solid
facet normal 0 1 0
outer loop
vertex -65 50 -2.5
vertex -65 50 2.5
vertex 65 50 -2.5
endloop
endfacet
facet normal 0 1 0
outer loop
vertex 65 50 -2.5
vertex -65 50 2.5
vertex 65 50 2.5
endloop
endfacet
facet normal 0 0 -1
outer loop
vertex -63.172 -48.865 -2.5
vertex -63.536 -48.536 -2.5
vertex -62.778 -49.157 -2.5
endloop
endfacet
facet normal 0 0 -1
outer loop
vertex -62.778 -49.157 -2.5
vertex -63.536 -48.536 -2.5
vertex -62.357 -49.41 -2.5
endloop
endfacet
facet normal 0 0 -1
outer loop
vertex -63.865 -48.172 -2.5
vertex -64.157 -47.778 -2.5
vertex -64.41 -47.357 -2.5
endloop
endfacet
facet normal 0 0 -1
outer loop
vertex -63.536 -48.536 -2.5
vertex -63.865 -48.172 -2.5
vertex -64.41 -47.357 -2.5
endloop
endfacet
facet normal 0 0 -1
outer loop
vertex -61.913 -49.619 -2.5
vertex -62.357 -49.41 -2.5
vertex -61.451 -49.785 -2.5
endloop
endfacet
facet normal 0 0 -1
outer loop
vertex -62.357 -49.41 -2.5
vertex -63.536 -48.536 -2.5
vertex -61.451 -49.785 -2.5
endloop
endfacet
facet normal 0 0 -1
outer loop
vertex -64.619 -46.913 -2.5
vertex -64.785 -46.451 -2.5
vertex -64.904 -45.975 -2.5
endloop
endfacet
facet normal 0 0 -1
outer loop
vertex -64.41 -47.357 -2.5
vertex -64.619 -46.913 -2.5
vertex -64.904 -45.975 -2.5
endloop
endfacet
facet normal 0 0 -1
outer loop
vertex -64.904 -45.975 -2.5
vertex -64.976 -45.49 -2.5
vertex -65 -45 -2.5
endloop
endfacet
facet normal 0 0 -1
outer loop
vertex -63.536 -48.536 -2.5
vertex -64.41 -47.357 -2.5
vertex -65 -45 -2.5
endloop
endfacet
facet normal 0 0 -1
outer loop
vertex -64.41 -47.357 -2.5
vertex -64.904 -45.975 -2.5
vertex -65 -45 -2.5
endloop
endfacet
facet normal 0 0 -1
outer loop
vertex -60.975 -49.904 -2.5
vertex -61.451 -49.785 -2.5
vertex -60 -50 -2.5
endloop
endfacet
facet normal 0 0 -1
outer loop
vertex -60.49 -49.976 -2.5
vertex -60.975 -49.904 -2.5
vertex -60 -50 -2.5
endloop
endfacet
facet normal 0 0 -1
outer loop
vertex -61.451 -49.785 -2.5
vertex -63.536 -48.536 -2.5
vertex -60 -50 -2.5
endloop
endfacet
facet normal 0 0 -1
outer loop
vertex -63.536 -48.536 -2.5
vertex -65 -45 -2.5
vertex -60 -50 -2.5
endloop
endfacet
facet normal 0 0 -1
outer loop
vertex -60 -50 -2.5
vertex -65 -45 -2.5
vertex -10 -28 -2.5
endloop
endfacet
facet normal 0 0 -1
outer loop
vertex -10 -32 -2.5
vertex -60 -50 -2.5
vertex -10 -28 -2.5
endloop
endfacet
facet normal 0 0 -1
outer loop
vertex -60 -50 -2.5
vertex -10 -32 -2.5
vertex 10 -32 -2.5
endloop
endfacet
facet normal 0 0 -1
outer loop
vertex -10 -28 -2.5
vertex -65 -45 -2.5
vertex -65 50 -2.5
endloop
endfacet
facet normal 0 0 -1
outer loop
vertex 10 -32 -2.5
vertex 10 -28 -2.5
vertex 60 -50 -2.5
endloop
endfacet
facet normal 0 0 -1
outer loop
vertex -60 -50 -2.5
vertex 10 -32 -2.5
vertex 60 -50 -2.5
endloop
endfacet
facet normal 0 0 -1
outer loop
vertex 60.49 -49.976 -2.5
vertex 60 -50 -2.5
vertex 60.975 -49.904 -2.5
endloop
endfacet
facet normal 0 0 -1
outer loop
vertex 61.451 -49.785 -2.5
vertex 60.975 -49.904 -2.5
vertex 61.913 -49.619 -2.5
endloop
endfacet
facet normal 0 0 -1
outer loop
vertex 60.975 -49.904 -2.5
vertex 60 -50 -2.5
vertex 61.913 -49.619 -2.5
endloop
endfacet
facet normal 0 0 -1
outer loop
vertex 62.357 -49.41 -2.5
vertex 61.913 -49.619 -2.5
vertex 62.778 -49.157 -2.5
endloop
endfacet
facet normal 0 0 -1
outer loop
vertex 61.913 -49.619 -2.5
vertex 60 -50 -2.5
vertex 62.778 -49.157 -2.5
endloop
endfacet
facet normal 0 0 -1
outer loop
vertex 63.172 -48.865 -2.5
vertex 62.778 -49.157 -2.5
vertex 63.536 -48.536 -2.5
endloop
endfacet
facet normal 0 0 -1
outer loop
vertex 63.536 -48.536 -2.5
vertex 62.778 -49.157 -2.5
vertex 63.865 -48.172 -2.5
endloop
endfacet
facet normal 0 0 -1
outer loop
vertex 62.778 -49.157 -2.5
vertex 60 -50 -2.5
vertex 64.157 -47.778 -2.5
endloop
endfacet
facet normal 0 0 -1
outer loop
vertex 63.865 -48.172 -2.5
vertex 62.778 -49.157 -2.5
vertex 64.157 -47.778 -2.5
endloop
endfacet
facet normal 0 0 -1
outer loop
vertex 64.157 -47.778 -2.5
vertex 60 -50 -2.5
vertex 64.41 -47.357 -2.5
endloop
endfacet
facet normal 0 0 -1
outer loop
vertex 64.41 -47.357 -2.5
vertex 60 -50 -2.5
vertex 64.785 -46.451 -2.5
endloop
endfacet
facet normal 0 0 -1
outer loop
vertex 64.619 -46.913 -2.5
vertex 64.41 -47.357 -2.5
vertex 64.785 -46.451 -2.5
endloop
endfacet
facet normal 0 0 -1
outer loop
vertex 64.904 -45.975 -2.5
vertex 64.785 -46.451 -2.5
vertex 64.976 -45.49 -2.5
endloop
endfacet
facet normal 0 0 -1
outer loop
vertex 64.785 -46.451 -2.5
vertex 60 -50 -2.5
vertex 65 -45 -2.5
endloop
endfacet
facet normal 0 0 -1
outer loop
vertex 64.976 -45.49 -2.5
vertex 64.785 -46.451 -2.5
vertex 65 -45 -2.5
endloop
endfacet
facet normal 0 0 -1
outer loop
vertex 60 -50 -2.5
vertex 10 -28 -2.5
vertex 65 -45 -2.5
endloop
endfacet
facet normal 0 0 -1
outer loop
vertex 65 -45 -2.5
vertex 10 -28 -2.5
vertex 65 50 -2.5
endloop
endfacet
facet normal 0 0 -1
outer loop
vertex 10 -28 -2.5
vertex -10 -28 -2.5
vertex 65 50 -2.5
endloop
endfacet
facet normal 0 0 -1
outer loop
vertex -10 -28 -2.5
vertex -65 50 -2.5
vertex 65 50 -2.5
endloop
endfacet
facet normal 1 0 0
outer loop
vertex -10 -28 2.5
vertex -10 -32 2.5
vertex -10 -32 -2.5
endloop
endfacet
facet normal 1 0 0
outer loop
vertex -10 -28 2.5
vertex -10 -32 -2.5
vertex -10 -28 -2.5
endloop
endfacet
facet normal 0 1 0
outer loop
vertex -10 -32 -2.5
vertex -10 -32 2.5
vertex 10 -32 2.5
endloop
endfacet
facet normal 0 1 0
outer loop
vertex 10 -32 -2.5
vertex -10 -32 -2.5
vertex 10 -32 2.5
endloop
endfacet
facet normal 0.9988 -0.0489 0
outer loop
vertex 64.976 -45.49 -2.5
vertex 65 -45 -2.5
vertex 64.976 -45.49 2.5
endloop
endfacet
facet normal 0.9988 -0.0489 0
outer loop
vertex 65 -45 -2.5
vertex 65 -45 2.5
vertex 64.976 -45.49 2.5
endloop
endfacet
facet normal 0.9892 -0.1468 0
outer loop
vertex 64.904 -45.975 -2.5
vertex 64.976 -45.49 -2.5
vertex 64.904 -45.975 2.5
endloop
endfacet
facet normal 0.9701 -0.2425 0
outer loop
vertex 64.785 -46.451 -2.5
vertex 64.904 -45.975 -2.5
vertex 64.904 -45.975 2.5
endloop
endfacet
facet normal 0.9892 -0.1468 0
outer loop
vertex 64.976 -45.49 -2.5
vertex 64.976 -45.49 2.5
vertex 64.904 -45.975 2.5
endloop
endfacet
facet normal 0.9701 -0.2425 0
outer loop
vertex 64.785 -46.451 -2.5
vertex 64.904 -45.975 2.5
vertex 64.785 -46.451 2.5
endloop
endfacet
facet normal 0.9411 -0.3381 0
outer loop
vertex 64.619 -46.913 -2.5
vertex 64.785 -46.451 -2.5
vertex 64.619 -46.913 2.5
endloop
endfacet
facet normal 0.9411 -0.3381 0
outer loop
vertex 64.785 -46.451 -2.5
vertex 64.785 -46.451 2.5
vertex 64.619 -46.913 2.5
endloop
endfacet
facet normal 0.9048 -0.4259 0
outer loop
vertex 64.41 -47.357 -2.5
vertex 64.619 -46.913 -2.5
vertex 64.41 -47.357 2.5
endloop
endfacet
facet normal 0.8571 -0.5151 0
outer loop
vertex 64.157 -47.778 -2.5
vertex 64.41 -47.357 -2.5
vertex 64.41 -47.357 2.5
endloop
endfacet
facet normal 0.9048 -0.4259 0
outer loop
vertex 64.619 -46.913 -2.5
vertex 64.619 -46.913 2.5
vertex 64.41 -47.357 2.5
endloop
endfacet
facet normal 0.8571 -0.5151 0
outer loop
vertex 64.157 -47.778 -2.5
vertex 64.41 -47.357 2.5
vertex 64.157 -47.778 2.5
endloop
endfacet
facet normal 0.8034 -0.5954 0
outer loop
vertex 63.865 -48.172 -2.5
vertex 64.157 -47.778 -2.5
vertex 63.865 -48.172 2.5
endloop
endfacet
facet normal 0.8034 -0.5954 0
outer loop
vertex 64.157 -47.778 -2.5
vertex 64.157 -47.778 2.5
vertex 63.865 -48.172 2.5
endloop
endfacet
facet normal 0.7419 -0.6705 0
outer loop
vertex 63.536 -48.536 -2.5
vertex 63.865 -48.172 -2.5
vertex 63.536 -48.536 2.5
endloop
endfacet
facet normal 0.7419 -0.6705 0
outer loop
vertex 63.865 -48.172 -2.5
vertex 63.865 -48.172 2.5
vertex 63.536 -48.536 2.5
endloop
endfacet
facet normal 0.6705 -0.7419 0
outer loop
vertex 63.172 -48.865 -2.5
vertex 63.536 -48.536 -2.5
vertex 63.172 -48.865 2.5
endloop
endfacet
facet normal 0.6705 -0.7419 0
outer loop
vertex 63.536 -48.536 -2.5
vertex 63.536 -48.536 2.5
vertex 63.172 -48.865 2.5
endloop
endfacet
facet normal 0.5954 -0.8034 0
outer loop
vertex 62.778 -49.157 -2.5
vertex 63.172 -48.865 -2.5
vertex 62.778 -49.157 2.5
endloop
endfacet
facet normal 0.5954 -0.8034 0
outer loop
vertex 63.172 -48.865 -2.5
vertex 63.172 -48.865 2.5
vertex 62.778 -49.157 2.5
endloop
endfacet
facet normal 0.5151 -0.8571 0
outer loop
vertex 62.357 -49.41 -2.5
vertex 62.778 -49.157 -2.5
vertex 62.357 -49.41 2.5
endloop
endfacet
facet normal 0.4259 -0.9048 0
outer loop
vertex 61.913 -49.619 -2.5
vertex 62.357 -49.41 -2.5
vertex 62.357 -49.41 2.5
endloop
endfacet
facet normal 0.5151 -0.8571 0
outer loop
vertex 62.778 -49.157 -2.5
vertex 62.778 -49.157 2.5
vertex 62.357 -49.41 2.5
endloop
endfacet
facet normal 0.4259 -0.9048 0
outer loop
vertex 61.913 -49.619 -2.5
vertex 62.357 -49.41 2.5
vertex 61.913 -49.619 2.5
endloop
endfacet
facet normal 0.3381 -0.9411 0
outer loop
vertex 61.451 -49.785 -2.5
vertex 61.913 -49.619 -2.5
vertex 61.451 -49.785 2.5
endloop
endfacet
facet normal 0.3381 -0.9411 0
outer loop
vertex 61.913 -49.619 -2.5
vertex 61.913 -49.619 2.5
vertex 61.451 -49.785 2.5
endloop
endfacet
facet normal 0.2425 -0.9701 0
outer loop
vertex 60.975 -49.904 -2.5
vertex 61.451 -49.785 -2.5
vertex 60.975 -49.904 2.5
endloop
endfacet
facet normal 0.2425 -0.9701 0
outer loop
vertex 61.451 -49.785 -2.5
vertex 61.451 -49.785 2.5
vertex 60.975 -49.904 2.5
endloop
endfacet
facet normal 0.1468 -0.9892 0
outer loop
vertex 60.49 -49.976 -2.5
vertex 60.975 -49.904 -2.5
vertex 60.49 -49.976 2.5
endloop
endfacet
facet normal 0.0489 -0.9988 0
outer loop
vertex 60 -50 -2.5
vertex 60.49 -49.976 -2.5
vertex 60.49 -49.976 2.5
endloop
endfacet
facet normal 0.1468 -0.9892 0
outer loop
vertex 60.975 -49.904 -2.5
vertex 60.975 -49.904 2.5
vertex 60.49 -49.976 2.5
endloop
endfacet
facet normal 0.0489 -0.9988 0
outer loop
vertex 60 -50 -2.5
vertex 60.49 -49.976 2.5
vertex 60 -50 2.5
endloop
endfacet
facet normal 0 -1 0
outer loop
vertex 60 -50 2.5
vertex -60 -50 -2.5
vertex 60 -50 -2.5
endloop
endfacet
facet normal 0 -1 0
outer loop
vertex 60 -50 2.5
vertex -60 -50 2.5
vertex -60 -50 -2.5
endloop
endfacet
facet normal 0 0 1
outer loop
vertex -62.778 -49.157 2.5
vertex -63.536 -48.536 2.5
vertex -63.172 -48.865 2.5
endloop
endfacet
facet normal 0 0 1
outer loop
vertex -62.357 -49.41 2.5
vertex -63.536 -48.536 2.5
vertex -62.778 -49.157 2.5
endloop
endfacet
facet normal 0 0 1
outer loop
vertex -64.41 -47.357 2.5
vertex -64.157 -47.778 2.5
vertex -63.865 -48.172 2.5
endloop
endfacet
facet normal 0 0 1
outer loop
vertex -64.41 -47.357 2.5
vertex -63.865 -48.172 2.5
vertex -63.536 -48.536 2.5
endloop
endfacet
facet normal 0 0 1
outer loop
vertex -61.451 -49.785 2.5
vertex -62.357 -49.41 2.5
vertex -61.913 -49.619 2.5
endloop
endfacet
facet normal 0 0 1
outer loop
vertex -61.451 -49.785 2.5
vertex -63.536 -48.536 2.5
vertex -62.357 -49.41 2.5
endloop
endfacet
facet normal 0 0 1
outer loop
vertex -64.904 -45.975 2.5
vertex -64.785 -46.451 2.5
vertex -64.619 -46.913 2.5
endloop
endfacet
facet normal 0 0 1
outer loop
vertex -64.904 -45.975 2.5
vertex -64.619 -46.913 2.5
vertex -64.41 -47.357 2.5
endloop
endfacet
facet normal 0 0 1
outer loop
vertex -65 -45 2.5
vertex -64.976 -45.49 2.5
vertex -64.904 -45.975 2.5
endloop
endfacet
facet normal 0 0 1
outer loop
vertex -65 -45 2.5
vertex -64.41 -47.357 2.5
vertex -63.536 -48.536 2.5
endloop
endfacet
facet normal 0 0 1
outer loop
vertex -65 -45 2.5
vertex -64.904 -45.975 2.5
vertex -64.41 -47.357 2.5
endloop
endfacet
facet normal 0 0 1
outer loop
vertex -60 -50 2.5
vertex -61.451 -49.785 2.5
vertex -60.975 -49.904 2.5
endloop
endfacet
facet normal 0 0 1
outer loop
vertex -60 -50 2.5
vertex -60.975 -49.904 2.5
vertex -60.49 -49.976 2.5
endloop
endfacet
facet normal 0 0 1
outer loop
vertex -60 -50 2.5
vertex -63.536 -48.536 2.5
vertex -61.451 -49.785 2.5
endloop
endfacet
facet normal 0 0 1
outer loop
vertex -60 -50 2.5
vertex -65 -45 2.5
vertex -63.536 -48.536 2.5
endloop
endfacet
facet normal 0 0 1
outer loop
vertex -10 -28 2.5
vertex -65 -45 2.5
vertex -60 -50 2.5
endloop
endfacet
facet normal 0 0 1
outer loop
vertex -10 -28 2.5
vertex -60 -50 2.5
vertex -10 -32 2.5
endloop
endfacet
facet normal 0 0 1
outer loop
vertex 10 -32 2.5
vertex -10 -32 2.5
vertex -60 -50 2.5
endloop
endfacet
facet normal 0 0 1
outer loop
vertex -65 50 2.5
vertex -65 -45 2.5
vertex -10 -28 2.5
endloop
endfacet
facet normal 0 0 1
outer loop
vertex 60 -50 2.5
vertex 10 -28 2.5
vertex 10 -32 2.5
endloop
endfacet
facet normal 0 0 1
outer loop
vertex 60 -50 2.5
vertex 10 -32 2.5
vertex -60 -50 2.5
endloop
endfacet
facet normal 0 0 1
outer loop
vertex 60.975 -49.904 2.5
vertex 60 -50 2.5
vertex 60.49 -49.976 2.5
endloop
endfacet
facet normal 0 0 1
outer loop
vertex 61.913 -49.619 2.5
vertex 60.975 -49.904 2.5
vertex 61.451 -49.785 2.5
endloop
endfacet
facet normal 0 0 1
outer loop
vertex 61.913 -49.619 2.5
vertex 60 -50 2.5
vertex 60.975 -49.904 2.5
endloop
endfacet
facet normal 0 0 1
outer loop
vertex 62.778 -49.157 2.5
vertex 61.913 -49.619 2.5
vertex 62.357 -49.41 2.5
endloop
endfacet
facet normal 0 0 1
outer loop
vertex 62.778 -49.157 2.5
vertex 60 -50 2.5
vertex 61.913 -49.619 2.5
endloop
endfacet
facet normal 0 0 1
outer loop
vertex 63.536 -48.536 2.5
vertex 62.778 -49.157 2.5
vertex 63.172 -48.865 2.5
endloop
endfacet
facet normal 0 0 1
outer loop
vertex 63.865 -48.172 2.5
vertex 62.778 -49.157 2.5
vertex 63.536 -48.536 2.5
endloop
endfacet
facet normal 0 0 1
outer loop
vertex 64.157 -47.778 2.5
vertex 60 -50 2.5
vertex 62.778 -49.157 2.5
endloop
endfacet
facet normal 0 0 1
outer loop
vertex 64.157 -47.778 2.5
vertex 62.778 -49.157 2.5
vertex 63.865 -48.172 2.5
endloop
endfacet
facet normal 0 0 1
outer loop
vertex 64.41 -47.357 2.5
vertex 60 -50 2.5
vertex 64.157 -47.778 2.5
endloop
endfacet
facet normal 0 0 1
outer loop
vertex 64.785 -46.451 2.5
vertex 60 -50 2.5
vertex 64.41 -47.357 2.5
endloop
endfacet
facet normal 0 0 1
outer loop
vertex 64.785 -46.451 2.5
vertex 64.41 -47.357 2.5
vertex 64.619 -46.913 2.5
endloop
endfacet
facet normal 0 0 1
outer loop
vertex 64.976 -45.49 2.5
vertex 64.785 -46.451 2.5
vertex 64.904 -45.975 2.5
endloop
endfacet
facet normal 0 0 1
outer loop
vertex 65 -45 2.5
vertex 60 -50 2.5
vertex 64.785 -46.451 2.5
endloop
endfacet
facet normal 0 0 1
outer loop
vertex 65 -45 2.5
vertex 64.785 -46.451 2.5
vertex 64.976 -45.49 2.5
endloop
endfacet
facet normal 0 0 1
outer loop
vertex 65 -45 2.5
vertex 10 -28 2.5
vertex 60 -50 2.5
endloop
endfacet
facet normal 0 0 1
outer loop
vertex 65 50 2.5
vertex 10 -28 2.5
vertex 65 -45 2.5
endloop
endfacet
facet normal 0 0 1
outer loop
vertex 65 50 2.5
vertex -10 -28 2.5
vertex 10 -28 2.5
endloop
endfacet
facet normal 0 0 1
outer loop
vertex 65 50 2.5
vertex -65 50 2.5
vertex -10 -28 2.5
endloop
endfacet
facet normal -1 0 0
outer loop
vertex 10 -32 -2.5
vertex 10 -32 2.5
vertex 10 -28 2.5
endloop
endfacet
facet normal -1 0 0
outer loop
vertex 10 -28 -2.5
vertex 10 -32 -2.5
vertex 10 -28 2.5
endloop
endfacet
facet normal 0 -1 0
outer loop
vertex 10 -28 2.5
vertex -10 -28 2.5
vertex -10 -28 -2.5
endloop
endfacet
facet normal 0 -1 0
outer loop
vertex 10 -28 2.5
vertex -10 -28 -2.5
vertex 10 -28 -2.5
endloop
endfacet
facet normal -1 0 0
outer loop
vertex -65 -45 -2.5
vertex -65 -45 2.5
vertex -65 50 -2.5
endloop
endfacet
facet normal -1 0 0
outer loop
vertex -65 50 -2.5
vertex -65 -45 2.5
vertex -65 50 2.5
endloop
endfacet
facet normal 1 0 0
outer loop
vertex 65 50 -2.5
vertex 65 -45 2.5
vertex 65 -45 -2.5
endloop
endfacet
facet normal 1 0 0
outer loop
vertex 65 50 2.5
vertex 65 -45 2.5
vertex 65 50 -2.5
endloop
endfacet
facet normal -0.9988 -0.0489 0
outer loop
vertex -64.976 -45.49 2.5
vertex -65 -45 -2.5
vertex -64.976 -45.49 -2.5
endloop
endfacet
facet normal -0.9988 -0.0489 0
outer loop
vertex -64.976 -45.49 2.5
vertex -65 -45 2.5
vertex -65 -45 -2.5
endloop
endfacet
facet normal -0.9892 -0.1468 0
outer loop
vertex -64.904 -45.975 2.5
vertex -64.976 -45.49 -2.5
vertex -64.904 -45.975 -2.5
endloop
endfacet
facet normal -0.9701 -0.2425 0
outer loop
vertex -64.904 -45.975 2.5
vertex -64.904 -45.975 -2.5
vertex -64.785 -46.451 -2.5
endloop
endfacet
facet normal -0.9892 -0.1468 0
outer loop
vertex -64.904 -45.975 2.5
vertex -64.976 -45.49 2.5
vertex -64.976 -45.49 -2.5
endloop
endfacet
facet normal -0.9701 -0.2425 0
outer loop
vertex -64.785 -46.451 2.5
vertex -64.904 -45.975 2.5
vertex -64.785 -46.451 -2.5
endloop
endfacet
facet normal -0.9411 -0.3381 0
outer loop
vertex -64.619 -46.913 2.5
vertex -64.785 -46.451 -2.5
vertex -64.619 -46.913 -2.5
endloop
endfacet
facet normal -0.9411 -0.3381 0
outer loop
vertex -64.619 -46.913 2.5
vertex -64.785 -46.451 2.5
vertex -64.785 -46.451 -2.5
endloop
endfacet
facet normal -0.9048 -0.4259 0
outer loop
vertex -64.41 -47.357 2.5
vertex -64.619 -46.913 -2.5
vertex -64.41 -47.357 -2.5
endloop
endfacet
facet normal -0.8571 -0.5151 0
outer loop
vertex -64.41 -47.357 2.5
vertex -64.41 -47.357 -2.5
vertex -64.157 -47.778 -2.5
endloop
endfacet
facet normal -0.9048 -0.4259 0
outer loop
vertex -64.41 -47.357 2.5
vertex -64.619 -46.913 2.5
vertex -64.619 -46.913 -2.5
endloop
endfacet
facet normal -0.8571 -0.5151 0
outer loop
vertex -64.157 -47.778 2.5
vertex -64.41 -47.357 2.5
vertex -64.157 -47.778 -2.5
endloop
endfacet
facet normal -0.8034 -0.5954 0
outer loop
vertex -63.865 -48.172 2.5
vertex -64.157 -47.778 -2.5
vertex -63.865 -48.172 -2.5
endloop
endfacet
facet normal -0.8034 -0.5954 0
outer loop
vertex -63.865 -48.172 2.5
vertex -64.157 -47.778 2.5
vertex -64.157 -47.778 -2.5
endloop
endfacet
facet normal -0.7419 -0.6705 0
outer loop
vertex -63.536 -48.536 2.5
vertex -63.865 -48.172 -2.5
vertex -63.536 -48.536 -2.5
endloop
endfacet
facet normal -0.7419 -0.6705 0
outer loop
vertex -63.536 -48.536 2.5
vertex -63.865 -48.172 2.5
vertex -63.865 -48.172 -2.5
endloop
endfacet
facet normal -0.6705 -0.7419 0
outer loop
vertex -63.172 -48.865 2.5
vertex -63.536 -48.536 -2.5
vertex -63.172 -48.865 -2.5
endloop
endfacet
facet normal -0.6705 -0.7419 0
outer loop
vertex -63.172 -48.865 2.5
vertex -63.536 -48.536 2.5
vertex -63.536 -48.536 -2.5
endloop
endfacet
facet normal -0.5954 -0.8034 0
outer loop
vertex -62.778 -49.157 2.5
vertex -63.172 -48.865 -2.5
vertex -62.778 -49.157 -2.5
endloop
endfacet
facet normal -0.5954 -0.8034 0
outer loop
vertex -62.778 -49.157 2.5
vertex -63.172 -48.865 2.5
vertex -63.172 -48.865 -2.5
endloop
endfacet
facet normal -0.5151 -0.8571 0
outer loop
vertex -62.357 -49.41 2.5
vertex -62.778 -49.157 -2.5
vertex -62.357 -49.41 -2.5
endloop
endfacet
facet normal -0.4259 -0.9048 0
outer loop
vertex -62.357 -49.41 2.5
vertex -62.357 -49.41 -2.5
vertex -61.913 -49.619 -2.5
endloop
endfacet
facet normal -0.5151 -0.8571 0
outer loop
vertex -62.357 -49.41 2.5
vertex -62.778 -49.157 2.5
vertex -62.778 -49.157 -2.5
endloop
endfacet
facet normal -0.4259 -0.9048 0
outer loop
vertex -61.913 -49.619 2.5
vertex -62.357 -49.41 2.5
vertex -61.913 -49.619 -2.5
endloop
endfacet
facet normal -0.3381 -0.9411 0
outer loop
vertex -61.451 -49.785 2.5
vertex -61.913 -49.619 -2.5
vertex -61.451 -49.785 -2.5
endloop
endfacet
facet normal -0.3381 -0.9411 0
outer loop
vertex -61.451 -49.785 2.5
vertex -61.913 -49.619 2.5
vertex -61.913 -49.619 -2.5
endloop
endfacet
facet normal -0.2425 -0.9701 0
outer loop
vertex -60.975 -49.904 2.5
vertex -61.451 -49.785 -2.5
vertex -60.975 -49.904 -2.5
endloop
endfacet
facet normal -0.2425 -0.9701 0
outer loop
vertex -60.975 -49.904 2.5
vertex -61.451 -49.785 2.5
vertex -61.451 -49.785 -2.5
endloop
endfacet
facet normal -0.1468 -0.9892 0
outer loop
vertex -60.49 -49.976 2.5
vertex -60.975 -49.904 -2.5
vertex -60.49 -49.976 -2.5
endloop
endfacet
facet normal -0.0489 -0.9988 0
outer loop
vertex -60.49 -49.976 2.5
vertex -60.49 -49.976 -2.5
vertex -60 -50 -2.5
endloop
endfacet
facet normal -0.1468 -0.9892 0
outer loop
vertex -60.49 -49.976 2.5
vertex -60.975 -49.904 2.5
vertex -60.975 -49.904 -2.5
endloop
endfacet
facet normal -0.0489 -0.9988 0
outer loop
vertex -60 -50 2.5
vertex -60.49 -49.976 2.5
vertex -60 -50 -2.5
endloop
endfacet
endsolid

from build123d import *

# Parameters (mm, degrees)
SKETCH2_W           = 130
SKETCH2_H           = 100
BOSS_EXTRUDE1_DEPTH = 2.5
FILLET1_R           = 5
SKETCH3_W           = 20
SKETCH3_H           = 4
CUT_EXTRUDE1_DEPTH  = 5


with BuildPart() as part:
    # Sketch2 → Boss-Extrude1 (new body, symmetric)
    with BuildSketch(Plane.XY):
        Rectangle(SKETCH2_W, SKETCH2_H)
    extrude(amount=BOSS_EXTRUDE1_DEPTH, both=True)

    # Fillet1
    fillet1_edges = [part.edges().sort_by_distance(p)[0] for p in [
        (-65, -50, 0),
        (65, -50, 0),
    ]]
    fillet(fillet1_edges, radius=FILLET1_R)

    # Sketch3 → Cut-Extrude1 (cut)
    with BuildSketch(Plane.XY.offset(2.5)):
        with Locations((0, -30)):
            Rectangle(SKETCH3_W, SKETCH3_H)
    extrude(amount=-CUT_EXTRUDE1_DEPTH, mode=Mode.SUBTRACT)


solid = part.part
